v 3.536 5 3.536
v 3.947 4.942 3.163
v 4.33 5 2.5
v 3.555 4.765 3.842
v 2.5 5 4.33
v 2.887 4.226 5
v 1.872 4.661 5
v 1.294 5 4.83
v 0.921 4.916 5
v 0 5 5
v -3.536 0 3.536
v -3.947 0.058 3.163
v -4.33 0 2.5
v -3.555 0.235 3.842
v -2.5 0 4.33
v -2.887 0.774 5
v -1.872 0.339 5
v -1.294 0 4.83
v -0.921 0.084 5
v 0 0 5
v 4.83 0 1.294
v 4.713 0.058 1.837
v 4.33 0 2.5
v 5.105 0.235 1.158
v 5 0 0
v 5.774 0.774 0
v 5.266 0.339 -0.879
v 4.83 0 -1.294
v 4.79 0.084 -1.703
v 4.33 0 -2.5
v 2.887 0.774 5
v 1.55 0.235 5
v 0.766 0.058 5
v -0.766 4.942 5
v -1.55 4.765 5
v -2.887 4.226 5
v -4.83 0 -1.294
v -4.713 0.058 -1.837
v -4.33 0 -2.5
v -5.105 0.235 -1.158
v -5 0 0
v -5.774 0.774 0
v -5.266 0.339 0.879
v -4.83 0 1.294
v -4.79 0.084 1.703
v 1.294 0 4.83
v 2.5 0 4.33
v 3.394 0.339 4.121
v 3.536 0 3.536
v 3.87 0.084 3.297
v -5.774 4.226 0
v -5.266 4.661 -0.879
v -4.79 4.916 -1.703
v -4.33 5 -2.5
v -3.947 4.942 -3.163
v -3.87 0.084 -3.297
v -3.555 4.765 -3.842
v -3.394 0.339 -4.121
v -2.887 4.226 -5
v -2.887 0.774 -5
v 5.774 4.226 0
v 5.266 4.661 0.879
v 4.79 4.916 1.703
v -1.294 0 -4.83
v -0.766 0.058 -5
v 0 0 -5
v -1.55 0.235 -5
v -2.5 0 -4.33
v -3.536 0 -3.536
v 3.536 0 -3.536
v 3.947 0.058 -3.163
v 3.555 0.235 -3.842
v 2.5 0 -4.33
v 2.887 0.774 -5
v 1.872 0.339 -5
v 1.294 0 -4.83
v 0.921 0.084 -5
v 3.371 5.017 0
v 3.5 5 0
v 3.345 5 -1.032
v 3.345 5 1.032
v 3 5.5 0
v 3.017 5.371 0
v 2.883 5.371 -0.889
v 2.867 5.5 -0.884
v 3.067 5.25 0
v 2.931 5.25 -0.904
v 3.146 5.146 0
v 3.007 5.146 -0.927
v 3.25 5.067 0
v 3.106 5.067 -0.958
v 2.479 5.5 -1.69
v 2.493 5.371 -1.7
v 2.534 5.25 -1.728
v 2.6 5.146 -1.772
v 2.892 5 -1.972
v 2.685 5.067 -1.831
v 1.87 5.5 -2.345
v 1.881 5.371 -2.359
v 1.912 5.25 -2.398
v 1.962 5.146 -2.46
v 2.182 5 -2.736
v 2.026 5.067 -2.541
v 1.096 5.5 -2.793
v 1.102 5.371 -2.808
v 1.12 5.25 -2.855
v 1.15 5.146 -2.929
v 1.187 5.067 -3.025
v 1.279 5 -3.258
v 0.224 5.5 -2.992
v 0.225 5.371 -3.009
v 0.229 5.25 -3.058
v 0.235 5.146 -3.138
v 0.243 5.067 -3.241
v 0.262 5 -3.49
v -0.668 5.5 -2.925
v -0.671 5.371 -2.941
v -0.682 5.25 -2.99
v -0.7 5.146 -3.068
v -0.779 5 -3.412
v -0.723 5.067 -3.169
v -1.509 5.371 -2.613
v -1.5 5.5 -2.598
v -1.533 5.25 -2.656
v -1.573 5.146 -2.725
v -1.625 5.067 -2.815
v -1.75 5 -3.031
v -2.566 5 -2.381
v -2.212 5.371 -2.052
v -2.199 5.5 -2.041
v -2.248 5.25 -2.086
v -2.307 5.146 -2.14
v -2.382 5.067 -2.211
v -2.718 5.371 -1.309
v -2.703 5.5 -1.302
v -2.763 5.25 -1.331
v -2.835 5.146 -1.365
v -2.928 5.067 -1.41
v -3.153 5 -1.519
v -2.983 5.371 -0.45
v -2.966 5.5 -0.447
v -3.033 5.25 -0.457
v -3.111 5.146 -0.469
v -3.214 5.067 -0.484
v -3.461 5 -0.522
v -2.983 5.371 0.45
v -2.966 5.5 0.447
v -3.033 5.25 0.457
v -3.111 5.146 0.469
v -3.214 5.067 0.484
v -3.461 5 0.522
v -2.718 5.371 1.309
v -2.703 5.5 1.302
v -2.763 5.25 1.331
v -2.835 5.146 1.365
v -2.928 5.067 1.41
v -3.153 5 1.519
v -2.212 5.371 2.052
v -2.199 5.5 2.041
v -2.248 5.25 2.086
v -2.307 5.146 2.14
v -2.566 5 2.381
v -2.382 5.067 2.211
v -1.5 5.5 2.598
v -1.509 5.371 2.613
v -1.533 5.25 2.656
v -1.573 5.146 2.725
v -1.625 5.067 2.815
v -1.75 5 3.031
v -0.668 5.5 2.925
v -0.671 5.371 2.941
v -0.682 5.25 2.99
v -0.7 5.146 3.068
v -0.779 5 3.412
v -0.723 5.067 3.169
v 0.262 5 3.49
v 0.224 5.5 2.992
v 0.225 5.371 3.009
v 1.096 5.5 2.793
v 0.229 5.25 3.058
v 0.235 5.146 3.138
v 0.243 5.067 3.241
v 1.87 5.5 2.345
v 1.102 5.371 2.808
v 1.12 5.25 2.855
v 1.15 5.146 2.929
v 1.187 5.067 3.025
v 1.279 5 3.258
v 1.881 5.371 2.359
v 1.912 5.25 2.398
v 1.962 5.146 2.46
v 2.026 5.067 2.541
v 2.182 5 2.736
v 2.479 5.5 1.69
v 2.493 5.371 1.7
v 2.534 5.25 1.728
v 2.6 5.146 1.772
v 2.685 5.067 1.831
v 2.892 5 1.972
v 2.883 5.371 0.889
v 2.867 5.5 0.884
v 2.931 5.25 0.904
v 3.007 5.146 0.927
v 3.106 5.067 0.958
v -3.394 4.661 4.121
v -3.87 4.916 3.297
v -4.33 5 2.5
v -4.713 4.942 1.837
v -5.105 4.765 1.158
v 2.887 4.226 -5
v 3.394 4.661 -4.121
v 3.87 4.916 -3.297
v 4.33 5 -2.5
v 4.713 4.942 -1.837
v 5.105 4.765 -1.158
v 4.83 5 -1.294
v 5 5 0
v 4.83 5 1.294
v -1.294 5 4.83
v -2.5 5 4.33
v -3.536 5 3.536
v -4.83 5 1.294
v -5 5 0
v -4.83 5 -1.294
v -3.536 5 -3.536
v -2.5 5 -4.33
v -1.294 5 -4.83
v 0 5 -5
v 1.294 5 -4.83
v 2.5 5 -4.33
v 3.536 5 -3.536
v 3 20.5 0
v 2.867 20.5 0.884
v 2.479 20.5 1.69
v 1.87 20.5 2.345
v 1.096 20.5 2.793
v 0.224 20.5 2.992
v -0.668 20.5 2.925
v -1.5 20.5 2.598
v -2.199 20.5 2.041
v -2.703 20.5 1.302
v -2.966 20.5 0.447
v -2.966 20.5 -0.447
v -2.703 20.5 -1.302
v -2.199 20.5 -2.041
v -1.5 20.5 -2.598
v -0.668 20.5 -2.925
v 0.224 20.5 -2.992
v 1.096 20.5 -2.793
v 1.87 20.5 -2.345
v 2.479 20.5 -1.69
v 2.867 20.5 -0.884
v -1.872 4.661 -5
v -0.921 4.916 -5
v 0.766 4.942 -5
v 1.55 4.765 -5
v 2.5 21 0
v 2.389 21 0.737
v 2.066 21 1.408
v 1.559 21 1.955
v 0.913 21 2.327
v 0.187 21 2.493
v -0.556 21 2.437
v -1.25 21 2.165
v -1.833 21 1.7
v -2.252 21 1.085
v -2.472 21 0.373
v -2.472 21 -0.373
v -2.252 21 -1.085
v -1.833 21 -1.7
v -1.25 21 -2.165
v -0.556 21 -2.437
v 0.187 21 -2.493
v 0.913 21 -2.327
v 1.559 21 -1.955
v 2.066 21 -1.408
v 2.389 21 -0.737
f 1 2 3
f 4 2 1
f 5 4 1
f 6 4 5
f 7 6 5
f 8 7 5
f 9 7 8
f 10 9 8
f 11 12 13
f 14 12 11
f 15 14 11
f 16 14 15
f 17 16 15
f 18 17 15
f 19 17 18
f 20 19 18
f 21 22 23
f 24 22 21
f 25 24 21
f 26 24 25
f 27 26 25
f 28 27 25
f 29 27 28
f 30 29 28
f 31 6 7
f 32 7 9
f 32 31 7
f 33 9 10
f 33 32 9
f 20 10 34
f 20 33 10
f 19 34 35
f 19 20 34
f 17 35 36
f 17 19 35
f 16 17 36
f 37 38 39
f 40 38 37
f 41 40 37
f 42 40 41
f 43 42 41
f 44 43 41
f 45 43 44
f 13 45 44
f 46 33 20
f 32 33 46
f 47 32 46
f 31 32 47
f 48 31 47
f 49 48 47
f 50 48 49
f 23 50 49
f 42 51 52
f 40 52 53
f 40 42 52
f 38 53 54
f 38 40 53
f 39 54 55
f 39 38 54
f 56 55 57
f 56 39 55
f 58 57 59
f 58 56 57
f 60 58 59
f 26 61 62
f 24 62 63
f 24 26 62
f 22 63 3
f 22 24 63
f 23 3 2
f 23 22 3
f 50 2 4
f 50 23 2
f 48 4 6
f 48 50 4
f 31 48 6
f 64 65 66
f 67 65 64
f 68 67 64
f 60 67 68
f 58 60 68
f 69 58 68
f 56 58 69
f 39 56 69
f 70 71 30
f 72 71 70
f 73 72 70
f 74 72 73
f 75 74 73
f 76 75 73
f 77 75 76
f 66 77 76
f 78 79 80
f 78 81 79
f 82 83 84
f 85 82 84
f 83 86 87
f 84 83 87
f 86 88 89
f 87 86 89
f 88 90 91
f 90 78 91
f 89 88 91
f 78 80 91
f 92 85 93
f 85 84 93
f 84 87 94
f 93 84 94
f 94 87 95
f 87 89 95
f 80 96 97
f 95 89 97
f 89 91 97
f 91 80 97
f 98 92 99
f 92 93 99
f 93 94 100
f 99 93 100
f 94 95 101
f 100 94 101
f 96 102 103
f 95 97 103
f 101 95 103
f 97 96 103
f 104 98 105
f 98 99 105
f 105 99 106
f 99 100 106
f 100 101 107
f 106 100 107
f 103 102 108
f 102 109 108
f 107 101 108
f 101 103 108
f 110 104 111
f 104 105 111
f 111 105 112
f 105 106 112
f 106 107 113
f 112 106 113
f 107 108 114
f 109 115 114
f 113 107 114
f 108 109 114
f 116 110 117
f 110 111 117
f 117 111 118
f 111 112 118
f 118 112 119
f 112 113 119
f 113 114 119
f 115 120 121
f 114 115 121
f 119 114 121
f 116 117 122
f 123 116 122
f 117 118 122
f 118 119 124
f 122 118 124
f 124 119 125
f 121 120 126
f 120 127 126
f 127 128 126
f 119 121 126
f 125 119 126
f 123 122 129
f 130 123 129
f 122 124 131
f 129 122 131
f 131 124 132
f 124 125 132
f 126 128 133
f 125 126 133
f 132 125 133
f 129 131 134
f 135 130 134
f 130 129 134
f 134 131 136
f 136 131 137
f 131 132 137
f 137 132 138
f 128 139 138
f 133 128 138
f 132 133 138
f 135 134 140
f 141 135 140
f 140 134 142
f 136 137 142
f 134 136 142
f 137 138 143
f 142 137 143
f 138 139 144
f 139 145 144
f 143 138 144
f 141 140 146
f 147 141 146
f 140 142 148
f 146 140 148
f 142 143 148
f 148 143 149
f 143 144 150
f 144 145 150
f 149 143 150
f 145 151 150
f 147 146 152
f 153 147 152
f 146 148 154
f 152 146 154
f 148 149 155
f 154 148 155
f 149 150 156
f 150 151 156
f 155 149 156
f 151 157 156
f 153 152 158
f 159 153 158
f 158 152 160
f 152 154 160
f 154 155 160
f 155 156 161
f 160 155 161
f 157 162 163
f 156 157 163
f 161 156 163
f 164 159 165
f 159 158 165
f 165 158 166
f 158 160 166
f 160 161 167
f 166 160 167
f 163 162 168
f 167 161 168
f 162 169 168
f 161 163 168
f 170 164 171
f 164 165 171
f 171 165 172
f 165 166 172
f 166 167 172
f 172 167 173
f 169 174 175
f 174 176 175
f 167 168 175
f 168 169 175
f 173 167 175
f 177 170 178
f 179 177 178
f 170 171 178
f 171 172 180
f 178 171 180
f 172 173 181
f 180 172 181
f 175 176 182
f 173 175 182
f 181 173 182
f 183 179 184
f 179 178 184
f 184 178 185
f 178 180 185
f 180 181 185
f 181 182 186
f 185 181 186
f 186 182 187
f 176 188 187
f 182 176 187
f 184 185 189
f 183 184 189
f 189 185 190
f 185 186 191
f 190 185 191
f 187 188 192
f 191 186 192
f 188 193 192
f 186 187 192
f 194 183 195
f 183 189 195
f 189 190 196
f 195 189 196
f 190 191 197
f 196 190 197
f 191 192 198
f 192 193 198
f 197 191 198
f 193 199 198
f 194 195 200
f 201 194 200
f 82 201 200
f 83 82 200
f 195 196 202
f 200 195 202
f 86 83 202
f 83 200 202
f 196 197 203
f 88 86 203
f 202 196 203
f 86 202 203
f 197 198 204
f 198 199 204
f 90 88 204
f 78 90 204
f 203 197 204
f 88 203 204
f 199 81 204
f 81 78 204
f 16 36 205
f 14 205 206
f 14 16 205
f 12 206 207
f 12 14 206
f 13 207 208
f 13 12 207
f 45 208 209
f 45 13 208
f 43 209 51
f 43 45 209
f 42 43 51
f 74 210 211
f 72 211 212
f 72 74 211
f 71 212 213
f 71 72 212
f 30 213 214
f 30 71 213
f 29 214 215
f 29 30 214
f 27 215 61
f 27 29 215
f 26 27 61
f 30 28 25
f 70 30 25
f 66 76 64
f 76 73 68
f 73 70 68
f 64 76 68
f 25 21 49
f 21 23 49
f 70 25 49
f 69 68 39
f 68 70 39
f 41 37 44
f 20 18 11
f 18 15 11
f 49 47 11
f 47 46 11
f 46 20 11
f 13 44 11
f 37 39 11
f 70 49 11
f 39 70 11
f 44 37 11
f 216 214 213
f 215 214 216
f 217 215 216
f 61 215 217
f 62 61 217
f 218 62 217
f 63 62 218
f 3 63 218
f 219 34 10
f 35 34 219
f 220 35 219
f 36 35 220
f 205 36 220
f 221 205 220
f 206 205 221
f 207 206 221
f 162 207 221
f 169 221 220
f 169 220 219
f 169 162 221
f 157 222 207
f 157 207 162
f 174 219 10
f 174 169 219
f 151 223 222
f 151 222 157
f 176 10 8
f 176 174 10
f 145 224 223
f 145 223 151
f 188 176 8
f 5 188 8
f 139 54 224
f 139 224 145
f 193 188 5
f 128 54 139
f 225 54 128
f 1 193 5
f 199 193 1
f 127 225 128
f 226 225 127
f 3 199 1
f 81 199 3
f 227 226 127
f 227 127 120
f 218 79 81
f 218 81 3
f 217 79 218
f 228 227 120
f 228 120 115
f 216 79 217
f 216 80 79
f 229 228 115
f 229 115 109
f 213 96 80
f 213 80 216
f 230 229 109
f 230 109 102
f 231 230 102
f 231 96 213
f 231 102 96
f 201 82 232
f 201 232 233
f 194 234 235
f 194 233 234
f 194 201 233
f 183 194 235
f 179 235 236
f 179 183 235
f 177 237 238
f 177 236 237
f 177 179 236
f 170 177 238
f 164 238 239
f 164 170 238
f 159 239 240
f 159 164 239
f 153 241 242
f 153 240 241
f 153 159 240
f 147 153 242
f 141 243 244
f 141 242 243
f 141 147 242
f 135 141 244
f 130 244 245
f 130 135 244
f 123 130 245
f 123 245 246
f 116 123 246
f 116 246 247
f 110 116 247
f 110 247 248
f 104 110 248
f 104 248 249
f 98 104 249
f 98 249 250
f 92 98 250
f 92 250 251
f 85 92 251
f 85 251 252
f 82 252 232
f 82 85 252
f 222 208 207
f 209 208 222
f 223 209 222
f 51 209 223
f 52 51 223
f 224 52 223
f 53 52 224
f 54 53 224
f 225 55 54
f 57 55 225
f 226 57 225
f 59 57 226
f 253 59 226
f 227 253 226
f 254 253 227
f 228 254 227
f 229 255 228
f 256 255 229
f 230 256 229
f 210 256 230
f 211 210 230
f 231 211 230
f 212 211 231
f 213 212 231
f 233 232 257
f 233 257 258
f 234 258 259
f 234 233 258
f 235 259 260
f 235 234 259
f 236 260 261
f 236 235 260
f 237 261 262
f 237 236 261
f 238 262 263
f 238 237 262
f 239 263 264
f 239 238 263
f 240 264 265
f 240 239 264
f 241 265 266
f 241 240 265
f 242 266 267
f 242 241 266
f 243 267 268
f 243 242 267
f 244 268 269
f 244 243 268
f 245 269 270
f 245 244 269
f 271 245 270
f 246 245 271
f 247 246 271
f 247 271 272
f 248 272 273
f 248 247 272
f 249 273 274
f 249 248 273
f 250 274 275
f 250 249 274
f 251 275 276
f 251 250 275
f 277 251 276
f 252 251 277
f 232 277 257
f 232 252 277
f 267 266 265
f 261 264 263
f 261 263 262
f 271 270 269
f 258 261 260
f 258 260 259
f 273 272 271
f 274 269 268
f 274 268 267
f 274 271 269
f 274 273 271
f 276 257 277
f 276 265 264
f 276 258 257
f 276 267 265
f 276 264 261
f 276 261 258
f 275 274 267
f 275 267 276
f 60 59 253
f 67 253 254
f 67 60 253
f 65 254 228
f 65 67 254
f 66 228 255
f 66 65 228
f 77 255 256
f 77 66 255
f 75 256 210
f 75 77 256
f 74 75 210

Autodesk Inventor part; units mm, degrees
ref_plane "YZ Plane" through (0, 0, 0) normal (1, 0, 0) x (0, 1, 0)
ref_plane "XZ Plane" through (0, 0, 0) normal (0, 1, 0) x (-1, 0, 0)
ref_plane "XY Plane" through (0, 0, 0) normal (0, 0, 1) x (1, 0, 0)
sketch "Esboço1" plane through (0, 0, 0) normal (0, 1, 0) x (-1, 0, 0)
  circle A0 centre (0, 0) radius 3
  line L0 (-2.8868, -5) -> (-5.7735, 0)
  line L1 (-5.7735, 0) -> (-2.8868, 5)
  line L2 (-2.8868, 5) -> (2.8868, 5)
  line L3 (2.8868, 5) -> (5.7735, 0)
  line L4 (5.7735, 0) -> (2.8868, -5)
  line L5 (2.8868, -5) -> (-2.8868, -5)
  dimension "d0" = 6
extrude "Extrusão1" add sketch "Esboço1" along normal blind 5
sketch "Esboço2" plane through (0, 0, 0) normal (1, 0, 0) x (0, 1, 0)
  point P0 (0, 0)
chamfer "Chanfro1" distance 0.5 angle 45 2 edges at (3, 0, 0) (3, 5, 0)
sketch "Esboço5" plane through (0, 0, 0) normal (0, -1, 0) x (1, 0, 0)
  circle A0 centre (0, 0) radius 5
extrude "Extrusão2" cut sketch "Esboço5" against normal through all draft 45 keep common part
sketch "Esboço6" plane through (0, 5, 0) normal (0, 1, 0) x (1, 0, 0)
  circle A0 centre (0, 0) radius 5
extrude "Extrusão3" cut sketch "Esboço6" against normal through all draft 45 keep common part
sketch "Esboço7" plane through (0, 5, 0) normal (0, 1, 0) x (1, 0, 0)
  circle A0 centre (0, 0) radius 3.5
extrude "Extrusão4" add sketch "Esboço7" against normal blind 5
sketch "Esboço8" plane through (0, 5, 0) normal (0, 1, 0) x (1, 0, 0)
  circle A0 centre (0, 0) radius 3
  dimension "d16" = 6
extrude "Extrusão5" add sketch "Esboço8" along normal blind 16
chamfer "Chanfro2" distance 0.5 angle 45 1 edges at (-3, 21, 0)
fillet "Arredondamento1" radius 0.5 1 edges at (-3, 5, 0)
thread "Rosca2" size "M6x1" class "6g" standard "ANSI Metric M Profile" full length
properties part number "porca m6" material "Aço inoxidável"
